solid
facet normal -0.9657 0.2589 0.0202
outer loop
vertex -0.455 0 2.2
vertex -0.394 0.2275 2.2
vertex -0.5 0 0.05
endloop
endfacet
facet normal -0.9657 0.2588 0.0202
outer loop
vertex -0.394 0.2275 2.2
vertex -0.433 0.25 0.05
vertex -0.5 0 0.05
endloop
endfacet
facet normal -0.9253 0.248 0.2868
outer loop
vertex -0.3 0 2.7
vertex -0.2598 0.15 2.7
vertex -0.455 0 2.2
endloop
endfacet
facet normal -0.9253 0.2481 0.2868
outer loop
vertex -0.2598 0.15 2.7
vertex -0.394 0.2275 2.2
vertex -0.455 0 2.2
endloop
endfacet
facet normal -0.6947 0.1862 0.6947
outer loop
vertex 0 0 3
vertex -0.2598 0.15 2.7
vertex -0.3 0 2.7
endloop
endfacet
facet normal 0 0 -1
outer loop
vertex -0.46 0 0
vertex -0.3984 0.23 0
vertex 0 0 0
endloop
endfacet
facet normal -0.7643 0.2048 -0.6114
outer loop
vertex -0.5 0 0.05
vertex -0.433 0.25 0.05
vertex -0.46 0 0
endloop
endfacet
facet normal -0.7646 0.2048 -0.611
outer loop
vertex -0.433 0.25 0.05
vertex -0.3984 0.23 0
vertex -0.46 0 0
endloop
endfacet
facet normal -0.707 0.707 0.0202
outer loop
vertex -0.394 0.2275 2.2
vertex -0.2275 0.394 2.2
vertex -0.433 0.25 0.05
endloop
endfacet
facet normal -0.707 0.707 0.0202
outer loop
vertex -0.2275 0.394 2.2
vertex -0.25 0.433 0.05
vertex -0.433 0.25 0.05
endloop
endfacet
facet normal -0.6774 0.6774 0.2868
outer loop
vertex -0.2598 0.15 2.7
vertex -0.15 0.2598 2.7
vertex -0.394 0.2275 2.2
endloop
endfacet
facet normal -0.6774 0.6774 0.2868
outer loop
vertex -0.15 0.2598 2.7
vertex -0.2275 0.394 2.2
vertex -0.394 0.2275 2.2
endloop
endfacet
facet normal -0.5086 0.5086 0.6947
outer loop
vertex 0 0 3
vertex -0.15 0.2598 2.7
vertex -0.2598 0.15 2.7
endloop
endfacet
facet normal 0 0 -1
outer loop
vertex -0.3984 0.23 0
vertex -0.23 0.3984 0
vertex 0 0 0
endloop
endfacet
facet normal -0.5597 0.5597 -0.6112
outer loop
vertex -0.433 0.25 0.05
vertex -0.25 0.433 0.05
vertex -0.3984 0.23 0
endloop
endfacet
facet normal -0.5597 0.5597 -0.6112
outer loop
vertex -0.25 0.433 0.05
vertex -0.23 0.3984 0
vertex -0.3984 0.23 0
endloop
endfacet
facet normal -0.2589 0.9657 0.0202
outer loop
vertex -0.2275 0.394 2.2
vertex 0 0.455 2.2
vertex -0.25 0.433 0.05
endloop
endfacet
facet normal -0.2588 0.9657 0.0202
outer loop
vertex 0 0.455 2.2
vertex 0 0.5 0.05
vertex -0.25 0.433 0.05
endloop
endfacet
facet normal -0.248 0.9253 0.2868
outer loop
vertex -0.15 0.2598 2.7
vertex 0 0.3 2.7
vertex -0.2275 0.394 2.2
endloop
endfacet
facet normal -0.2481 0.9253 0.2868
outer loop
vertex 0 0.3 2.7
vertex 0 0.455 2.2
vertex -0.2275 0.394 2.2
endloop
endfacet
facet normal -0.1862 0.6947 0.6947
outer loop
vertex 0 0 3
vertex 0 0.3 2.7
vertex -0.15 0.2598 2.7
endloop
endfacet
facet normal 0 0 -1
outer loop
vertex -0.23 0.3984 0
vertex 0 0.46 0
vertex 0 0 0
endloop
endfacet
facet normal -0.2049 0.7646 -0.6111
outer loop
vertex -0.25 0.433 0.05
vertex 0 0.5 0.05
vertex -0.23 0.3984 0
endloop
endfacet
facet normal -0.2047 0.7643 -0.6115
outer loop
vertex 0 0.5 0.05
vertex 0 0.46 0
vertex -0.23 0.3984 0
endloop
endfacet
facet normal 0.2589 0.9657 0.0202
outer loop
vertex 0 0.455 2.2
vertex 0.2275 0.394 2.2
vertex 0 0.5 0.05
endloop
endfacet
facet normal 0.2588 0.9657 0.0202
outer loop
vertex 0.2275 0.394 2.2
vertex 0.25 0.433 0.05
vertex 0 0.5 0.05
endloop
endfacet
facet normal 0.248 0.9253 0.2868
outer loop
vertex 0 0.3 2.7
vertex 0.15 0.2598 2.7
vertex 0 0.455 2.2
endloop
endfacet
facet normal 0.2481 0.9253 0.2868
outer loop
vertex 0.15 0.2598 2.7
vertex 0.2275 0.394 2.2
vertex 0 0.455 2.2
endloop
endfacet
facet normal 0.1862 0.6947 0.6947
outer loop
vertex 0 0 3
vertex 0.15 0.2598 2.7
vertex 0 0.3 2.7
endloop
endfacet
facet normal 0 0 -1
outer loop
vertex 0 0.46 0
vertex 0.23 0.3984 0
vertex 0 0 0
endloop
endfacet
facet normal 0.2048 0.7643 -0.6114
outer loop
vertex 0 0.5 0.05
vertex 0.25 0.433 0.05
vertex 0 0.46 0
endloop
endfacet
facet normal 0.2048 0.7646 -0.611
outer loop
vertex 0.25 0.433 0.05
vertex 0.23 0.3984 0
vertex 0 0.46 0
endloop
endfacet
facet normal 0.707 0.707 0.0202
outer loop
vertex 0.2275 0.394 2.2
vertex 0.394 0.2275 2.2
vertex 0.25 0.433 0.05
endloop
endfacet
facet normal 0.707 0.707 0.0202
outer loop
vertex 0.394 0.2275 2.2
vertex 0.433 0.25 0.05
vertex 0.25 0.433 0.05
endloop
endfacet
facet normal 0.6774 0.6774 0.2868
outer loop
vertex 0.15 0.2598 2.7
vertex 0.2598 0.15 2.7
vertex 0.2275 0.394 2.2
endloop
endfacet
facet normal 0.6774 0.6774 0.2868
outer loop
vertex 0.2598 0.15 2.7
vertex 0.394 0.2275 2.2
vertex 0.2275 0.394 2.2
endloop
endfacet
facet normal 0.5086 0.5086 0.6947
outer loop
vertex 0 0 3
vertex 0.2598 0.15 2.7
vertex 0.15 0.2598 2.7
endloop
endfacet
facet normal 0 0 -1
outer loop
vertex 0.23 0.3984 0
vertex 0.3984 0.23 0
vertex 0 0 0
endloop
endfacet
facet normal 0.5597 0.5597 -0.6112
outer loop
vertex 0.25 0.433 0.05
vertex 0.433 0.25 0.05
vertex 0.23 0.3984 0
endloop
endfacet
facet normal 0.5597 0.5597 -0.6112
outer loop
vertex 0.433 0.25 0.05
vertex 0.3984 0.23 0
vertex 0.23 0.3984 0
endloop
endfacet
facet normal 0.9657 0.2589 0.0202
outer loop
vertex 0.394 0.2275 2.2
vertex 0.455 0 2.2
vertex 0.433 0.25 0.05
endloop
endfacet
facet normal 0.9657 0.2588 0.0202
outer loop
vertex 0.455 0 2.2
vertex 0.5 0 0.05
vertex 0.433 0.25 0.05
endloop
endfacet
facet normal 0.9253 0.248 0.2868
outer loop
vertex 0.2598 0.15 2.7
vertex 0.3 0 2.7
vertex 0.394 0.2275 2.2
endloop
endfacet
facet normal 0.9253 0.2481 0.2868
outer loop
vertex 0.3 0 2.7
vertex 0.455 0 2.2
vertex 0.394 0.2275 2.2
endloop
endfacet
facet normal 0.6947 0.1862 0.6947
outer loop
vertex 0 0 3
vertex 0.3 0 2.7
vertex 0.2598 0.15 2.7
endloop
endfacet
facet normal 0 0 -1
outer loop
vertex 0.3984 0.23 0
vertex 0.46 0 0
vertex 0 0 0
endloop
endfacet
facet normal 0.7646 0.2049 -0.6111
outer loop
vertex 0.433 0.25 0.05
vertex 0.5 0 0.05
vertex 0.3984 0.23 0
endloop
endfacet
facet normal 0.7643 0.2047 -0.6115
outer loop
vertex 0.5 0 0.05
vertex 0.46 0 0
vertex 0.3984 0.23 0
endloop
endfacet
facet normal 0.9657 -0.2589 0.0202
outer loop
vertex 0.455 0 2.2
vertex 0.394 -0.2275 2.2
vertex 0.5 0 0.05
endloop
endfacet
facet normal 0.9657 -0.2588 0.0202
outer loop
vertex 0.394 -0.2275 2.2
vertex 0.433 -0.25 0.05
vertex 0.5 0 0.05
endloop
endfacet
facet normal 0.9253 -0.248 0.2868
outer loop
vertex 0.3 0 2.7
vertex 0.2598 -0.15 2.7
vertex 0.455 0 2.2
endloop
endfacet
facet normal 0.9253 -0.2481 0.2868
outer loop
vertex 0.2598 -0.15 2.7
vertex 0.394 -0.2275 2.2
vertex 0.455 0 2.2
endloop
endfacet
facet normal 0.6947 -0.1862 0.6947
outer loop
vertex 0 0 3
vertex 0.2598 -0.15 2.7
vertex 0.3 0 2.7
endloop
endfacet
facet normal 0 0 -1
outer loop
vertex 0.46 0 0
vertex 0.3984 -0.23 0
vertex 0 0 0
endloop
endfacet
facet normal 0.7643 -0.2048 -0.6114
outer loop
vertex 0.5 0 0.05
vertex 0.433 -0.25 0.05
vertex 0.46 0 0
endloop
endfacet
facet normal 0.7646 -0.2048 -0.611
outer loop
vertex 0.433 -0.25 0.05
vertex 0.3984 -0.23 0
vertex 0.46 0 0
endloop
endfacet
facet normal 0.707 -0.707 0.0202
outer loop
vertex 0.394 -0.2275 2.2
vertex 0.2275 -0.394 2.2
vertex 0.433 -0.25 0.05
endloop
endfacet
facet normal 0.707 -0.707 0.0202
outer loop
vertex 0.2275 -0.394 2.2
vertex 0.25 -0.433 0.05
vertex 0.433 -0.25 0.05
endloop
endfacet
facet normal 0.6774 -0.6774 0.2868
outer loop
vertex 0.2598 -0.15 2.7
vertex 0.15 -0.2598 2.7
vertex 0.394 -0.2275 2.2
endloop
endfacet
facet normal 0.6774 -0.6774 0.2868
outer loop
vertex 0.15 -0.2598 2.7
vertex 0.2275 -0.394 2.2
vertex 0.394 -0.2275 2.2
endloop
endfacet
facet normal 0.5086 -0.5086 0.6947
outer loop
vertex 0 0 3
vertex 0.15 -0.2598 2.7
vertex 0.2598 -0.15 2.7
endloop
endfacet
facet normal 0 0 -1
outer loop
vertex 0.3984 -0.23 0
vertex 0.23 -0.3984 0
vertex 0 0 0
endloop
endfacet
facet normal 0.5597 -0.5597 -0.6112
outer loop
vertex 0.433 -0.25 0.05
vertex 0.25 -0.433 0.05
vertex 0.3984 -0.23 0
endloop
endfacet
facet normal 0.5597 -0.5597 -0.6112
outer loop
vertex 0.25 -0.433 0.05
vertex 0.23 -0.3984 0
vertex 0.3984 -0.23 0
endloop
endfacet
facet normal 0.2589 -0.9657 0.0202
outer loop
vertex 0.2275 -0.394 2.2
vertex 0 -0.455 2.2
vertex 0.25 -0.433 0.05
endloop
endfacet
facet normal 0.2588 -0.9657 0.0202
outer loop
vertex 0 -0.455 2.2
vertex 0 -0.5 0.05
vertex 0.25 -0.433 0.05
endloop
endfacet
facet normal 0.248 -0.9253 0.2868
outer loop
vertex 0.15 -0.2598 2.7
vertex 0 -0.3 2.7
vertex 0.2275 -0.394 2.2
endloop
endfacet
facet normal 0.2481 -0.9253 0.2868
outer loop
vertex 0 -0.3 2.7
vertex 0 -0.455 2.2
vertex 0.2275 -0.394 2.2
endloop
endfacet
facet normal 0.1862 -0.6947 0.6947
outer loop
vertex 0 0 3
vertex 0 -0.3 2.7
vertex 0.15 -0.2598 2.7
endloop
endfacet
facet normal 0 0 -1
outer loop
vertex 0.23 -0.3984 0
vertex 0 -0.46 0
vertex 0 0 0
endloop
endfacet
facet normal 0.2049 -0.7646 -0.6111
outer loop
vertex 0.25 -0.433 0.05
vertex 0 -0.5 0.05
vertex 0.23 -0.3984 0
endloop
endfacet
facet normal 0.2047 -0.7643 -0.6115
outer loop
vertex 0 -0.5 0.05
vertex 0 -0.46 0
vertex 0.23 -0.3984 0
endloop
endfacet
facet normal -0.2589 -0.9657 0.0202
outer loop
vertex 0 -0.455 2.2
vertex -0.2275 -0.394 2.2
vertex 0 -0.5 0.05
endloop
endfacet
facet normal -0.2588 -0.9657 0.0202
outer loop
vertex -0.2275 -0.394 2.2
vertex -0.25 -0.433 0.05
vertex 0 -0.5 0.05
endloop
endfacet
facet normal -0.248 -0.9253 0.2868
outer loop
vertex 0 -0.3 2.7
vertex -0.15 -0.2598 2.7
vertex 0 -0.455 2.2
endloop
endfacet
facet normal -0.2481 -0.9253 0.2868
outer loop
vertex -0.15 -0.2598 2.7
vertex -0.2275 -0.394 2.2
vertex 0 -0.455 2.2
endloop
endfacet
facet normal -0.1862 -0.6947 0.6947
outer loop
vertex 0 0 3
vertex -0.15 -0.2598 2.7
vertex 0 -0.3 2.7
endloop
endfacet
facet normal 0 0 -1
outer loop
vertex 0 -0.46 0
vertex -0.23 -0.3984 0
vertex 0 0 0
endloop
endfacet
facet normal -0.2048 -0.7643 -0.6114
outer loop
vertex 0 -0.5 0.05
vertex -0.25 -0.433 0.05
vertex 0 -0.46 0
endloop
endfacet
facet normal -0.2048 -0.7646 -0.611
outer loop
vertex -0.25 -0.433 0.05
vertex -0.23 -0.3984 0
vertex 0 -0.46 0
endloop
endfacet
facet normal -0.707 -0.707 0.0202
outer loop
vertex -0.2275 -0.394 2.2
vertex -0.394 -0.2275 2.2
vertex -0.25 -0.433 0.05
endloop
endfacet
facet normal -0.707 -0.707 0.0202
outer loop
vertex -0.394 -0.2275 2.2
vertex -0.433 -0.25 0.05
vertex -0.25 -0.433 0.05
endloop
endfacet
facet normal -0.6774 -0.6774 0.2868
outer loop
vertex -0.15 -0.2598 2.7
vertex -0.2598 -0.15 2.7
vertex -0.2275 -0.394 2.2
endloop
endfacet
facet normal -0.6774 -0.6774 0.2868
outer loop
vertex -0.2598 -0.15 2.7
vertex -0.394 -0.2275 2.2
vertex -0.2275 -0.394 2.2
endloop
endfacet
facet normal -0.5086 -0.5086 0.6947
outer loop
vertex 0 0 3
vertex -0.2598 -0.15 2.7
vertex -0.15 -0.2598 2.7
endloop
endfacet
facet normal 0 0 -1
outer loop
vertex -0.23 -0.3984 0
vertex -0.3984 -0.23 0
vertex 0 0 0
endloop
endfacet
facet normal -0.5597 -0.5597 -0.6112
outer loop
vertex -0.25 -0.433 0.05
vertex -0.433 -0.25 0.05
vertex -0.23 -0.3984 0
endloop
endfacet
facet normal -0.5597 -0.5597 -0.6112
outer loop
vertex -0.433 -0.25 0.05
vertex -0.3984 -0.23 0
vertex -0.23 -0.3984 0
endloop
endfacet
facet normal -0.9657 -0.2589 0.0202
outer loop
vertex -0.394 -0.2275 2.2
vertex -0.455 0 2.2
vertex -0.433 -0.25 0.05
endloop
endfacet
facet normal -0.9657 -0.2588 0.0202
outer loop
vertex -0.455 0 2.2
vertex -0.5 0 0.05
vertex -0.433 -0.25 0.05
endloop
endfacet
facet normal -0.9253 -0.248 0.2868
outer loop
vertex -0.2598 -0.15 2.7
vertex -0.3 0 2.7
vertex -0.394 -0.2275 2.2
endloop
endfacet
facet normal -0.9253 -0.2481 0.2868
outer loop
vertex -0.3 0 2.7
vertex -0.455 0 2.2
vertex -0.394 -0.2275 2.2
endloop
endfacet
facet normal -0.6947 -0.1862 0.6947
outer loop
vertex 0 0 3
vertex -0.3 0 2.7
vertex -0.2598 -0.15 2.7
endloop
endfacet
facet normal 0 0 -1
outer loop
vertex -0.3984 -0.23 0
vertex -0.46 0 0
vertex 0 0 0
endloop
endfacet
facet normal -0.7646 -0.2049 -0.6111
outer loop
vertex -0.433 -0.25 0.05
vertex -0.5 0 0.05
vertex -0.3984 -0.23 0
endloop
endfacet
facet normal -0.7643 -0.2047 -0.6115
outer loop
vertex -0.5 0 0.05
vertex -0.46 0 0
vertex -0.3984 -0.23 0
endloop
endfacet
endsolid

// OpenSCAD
// Carousel Autoloader 0.2.24 - separate projectile of two-piece ammunition, unit calibre (d = 1).
// Flat base at z = 0, nose at z = P0 = 3 (toward the gun). Zones (mirrored in AutoloaderModelGeometry):
//   A [0, 0.05]        base and driving band (geleideband)   fixed
//   B [0.05, P0-0.8]   projectile body                        stretched to the true projectile length
//   C [P0-0.8, P0]     ogive (neus/ogief) and tip             fixed
// The band has radius 0.5 with vertices on the x and y axes: bounding box = packer diameter.
P0 = 3;
fn = 12;   // 12 (fine) or 8 (medium/coarse)
rotate_extrude($fn = fn)
  polygon([[0,0],[0.46,0],[0.5,0.05],[0.455,P0-0.8],[0.30,P0-0.3],[0,P0]]);
